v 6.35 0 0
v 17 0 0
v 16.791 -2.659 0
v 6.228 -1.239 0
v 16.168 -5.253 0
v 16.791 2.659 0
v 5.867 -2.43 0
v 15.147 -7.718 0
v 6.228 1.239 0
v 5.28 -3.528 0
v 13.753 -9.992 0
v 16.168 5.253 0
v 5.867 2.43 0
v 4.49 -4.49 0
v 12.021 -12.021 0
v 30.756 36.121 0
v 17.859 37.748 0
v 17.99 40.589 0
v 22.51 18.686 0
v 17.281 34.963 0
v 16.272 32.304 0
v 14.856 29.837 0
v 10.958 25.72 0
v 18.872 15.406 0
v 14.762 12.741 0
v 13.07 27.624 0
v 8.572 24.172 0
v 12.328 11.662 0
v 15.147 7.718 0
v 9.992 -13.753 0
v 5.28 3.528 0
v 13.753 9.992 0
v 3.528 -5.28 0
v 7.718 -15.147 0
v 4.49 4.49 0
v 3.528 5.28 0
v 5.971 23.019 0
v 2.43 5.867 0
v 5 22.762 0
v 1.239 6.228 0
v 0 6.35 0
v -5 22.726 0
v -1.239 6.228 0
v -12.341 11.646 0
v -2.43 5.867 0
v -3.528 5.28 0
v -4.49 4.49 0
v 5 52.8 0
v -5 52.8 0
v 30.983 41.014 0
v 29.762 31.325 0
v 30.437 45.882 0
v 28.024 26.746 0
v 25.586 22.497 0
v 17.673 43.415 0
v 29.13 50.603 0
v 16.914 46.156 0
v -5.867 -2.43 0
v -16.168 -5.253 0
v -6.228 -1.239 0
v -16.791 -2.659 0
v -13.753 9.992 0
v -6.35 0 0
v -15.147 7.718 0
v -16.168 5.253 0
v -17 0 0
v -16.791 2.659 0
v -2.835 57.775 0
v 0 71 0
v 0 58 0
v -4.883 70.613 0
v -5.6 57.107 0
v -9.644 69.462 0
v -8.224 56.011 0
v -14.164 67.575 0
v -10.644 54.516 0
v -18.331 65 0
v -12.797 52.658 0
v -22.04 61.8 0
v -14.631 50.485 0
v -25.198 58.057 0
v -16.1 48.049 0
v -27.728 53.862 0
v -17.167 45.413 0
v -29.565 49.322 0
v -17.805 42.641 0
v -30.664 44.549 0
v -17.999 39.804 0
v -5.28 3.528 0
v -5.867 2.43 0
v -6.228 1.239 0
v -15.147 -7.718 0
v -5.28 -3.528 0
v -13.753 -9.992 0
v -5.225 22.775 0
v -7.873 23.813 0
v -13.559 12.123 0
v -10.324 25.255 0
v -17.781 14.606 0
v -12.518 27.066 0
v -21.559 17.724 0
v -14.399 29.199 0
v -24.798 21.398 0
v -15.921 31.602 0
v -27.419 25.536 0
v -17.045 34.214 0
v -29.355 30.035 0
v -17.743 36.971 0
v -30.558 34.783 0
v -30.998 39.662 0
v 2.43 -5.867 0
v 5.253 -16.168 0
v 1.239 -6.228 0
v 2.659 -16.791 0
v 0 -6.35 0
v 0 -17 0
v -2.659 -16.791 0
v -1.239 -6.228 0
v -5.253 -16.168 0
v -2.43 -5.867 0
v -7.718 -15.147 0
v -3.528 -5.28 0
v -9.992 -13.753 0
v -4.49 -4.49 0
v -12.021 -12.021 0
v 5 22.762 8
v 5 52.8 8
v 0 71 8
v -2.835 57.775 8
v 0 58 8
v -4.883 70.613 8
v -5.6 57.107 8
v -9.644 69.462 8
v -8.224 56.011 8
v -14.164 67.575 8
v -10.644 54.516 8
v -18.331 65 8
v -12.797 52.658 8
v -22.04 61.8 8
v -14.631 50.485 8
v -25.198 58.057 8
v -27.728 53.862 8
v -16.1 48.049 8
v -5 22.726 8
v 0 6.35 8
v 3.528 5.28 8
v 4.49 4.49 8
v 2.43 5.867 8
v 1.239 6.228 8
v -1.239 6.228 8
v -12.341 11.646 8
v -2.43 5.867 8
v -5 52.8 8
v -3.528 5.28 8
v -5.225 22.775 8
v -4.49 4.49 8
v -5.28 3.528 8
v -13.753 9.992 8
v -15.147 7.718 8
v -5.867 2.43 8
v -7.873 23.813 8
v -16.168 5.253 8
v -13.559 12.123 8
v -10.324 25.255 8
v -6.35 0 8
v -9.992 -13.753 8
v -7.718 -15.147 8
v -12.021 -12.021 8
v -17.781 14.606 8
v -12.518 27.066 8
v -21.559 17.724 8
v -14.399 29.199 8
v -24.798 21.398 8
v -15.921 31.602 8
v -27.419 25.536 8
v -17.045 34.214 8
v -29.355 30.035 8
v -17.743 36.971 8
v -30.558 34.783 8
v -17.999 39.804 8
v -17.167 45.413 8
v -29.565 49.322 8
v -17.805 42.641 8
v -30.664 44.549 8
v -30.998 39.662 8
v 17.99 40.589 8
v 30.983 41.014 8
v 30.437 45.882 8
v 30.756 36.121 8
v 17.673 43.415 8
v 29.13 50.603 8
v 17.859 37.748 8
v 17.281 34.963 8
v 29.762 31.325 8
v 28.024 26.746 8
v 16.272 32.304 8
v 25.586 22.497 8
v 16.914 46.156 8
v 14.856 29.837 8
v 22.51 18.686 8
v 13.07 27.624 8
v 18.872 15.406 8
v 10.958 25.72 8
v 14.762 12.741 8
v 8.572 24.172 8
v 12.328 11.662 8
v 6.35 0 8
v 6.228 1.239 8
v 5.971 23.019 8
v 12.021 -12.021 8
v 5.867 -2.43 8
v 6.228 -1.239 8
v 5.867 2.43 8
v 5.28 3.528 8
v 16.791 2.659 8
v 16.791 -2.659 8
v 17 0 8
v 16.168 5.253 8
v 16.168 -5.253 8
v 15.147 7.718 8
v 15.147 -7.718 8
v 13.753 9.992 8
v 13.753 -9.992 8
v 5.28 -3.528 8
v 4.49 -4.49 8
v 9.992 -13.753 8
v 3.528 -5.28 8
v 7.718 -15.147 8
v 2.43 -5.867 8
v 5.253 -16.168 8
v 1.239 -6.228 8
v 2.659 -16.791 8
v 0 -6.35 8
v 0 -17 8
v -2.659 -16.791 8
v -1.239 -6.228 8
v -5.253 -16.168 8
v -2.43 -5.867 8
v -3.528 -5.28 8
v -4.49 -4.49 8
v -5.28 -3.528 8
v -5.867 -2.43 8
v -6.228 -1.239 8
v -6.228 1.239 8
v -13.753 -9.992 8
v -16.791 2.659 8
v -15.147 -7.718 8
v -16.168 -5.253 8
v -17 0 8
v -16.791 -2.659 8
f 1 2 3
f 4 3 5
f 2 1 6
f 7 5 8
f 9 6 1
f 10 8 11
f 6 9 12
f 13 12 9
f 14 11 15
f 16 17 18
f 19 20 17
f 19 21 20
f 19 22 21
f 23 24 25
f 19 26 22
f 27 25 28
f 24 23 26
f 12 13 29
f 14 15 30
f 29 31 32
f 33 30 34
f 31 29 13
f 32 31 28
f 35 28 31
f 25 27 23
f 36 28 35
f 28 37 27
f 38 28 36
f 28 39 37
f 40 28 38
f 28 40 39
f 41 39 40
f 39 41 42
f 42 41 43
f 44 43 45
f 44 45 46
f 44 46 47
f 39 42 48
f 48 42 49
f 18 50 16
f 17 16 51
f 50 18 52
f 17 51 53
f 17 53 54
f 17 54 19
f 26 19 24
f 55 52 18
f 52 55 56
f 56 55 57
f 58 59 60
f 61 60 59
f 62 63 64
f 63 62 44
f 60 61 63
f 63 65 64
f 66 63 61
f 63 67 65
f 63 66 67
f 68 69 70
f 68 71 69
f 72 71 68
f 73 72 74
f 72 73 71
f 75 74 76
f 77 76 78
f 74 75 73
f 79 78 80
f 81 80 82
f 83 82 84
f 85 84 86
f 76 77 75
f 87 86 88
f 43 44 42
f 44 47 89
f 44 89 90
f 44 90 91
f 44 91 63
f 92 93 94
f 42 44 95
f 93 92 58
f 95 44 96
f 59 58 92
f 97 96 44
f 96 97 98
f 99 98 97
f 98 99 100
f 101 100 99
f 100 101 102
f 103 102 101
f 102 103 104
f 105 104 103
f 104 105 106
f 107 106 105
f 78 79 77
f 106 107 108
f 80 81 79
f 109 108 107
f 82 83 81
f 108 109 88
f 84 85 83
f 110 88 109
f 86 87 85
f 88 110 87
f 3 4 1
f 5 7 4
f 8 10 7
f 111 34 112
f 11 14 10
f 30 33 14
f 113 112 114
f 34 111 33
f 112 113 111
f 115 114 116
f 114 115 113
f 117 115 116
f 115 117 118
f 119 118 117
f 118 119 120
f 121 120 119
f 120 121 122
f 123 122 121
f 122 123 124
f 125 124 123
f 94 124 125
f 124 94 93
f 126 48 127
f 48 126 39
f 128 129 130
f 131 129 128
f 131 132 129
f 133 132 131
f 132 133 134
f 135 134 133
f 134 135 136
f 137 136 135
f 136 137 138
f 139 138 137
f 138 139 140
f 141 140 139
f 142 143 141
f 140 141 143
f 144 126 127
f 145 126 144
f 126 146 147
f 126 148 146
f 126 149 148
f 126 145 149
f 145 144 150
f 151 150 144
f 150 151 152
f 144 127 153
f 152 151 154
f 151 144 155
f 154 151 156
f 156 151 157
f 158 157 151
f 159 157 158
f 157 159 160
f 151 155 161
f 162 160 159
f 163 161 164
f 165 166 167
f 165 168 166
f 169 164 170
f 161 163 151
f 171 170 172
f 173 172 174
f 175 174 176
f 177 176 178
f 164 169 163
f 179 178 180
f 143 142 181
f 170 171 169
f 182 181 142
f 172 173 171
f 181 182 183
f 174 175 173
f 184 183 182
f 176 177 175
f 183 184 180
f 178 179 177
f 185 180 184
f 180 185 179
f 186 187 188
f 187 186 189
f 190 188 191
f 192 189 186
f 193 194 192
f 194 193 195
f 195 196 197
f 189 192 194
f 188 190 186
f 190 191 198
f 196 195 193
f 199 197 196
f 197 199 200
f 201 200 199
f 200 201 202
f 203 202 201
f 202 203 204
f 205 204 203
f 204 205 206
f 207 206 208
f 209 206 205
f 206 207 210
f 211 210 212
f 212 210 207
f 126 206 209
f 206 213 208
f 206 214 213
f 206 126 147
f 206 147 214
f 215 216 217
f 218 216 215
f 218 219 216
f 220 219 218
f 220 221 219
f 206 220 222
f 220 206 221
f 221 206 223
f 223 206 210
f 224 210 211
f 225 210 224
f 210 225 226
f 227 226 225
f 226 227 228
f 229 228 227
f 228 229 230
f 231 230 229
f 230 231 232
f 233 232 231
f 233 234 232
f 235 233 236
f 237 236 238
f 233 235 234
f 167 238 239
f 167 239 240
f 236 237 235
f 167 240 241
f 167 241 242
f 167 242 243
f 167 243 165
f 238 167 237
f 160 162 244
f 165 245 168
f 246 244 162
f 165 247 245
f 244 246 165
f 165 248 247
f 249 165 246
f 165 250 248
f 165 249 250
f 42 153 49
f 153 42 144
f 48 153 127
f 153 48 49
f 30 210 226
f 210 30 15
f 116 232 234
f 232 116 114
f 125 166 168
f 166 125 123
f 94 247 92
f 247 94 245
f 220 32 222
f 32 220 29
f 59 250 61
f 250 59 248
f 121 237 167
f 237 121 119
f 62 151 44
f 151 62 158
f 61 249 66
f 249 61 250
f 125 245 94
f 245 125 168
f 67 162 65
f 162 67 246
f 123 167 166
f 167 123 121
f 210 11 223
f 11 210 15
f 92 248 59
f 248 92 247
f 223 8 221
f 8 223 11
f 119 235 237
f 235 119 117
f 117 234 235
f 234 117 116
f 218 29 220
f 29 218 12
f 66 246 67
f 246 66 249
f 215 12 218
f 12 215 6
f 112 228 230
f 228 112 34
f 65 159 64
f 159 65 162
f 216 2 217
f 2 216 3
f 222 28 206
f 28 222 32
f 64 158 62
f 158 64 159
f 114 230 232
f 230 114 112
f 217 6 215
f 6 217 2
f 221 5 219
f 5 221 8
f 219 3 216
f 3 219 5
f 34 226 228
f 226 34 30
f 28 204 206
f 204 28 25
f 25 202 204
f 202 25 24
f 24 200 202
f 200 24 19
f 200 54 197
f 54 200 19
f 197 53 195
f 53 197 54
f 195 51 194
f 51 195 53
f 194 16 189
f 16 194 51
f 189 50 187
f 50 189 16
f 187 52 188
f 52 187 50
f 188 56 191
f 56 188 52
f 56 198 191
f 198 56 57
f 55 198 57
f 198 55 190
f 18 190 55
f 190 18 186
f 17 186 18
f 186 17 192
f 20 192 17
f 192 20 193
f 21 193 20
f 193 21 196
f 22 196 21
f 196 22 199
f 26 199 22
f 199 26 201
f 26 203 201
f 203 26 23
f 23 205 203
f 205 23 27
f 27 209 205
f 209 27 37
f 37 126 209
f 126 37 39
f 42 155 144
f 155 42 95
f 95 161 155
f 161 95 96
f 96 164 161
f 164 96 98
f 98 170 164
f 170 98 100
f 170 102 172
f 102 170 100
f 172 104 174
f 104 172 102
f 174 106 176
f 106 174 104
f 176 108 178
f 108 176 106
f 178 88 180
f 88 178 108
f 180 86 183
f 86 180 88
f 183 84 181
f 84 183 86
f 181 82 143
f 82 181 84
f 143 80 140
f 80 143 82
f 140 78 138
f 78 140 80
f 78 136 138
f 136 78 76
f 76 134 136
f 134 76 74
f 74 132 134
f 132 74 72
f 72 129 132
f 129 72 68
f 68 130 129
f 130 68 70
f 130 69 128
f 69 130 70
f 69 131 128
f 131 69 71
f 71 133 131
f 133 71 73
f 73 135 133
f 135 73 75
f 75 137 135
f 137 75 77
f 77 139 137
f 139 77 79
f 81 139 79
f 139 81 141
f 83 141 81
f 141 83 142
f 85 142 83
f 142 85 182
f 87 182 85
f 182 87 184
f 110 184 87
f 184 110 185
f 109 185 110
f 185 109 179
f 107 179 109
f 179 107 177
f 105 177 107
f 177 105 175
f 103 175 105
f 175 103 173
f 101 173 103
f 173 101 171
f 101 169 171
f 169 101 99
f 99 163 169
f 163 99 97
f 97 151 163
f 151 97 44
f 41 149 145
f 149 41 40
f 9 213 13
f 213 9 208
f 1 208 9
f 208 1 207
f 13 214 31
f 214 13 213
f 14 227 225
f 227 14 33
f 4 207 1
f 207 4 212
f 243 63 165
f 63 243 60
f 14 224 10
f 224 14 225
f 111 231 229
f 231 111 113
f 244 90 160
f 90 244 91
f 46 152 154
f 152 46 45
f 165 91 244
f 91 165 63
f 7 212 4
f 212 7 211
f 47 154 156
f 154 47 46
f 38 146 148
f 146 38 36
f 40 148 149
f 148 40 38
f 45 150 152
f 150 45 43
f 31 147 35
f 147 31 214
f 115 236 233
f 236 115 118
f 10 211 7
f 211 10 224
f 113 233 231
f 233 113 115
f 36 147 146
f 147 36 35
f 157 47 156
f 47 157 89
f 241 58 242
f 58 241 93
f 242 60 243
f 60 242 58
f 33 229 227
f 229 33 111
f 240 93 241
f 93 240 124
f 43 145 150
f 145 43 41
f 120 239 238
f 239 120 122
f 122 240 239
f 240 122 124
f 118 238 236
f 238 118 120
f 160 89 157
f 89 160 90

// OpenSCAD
$fn = 32;

// ----------------------------------------------------------------------
// Hook: 80 mm shank into a 18 mm curl, 8 mm thick
// ----------------------------------------------------------------------

// --- parameters (mm) ---
shank_len = 80;           // shank length from the boss centre
shank_w = 10;             // shank width
boss_d = 34;              // boss diameter
bore_d = 12.7;            // boss bore
curl_in = 18;             // curl inner radius
curl_out = 31;            // curl outer radius
curl_sweep = 290;         // curl sweep angle
hook_t = 8;               // hook thickness

shank_profile = [[-5, 52.8], [5, 52.8], [5, 15], [-5, 15]];
boss_profile = [[17, 0], [16.791, 2.659], [16.168, 5.253], [15.147, 7.718], [13.753, 9.992], [12.021, 12.021], [9.992, 13.753], [7.718, 15.147], [5.253, 16.168], [2.659, 16.791], [0, 17], [-2.659, 16.791], [-5.253, 16.168], [-7.718, 15.147], [-9.992, 13.753], [-12.021, 12.021], [-13.753, 9.992], [-15.147, 7.718], [-16.168, 5.253], [-16.791, 2.659], [-17, 0], [-16.791, -2.659], [-16.168, -5.253], [-15.147, -7.718], [-13.753, -9.992], [-12.021, -12.021], [-9.992, -13.753], [-7.718, -15.147], [-5.253, -16.168], [-2.659, -16.791], [0, -17], [2.659, -16.791], [5.253, -16.168], [7.718, -15.147], [9.992, -13.753], [12.021, -12.021], [13.753, -9.992], [15.147, -7.718], [16.168, -5.253], [16.791, -2.659]];
curl_profile = [[0, 71], [-4.883, 70.613], [-9.644, 69.462], [-14.164, 67.575], [-18.331, 65], [-22.04, 61.8], [-25.198, 58.057], [-27.728, 53.862], [-29.565, 49.322], [-30.664, 44.549], [-30.998, 39.662], [-30.558, 34.783], [-29.355, 30.035], [-27.419, 25.536], [-24.798, 21.398], [-21.559, 17.724], [-17.781, 14.606], [-13.559, 12.123], [-8.999, 10.335], [-4.214, 9.288], [0.676, 9.007], [5.55, 9.501], [10.284, 10.756], [14.762, 12.741], [18.872, 15.406], [22.51, 18.686], [25.586, 22.497], [28.024, 26.746], [29.762, 31.325], [30.756, 36.121], [30.983, 41.014], [30.437, 45.882], [29.13, 50.603], [16.914, 46.156], [17.673, 43.415], [17.99, 40.589], [17.859, 37.748], [17.281, 34.963], [16.272, 32.304], [14.856, 29.837], [13.07, 27.624], [10.958, 25.72], [8.572, 24.172], [5.971, 23.019], [3.222, 22.291], [0.393, 22.004], [-2.447, 22.167], [-5.225, 22.775], [-7.873, 23.813], [-10.324, 25.255], [-12.518, 27.066], [-14.399, 29.199], [-15.921, 31.602], [-17.045, 34.214], [-17.743, 36.971], [-17.999, 39.804], [-17.805, 42.641], [-17.167, 45.413], [-16.1, 48.049], [-14.631, 50.485], [-12.797, 52.658], [-10.644, 54.516], [-8.224, 56.011], [-5.6, 57.107], [-2.835, 57.775], [0, 58]];

difference() {
  union() {
    /* three overlapping outlines: shank, boss and the smooth curl */
    linear_extrude(height = hook_t) polygon(shank_profile);
    linear_extrude(height = hook_t) polygon(boss_profile);
    linear_extrude(height = hook_t) polygon(curl_profile);
  }
  translate([0, 0, -2.5]) cylinder(h = hook_t + 5, d = bore_d);
}
